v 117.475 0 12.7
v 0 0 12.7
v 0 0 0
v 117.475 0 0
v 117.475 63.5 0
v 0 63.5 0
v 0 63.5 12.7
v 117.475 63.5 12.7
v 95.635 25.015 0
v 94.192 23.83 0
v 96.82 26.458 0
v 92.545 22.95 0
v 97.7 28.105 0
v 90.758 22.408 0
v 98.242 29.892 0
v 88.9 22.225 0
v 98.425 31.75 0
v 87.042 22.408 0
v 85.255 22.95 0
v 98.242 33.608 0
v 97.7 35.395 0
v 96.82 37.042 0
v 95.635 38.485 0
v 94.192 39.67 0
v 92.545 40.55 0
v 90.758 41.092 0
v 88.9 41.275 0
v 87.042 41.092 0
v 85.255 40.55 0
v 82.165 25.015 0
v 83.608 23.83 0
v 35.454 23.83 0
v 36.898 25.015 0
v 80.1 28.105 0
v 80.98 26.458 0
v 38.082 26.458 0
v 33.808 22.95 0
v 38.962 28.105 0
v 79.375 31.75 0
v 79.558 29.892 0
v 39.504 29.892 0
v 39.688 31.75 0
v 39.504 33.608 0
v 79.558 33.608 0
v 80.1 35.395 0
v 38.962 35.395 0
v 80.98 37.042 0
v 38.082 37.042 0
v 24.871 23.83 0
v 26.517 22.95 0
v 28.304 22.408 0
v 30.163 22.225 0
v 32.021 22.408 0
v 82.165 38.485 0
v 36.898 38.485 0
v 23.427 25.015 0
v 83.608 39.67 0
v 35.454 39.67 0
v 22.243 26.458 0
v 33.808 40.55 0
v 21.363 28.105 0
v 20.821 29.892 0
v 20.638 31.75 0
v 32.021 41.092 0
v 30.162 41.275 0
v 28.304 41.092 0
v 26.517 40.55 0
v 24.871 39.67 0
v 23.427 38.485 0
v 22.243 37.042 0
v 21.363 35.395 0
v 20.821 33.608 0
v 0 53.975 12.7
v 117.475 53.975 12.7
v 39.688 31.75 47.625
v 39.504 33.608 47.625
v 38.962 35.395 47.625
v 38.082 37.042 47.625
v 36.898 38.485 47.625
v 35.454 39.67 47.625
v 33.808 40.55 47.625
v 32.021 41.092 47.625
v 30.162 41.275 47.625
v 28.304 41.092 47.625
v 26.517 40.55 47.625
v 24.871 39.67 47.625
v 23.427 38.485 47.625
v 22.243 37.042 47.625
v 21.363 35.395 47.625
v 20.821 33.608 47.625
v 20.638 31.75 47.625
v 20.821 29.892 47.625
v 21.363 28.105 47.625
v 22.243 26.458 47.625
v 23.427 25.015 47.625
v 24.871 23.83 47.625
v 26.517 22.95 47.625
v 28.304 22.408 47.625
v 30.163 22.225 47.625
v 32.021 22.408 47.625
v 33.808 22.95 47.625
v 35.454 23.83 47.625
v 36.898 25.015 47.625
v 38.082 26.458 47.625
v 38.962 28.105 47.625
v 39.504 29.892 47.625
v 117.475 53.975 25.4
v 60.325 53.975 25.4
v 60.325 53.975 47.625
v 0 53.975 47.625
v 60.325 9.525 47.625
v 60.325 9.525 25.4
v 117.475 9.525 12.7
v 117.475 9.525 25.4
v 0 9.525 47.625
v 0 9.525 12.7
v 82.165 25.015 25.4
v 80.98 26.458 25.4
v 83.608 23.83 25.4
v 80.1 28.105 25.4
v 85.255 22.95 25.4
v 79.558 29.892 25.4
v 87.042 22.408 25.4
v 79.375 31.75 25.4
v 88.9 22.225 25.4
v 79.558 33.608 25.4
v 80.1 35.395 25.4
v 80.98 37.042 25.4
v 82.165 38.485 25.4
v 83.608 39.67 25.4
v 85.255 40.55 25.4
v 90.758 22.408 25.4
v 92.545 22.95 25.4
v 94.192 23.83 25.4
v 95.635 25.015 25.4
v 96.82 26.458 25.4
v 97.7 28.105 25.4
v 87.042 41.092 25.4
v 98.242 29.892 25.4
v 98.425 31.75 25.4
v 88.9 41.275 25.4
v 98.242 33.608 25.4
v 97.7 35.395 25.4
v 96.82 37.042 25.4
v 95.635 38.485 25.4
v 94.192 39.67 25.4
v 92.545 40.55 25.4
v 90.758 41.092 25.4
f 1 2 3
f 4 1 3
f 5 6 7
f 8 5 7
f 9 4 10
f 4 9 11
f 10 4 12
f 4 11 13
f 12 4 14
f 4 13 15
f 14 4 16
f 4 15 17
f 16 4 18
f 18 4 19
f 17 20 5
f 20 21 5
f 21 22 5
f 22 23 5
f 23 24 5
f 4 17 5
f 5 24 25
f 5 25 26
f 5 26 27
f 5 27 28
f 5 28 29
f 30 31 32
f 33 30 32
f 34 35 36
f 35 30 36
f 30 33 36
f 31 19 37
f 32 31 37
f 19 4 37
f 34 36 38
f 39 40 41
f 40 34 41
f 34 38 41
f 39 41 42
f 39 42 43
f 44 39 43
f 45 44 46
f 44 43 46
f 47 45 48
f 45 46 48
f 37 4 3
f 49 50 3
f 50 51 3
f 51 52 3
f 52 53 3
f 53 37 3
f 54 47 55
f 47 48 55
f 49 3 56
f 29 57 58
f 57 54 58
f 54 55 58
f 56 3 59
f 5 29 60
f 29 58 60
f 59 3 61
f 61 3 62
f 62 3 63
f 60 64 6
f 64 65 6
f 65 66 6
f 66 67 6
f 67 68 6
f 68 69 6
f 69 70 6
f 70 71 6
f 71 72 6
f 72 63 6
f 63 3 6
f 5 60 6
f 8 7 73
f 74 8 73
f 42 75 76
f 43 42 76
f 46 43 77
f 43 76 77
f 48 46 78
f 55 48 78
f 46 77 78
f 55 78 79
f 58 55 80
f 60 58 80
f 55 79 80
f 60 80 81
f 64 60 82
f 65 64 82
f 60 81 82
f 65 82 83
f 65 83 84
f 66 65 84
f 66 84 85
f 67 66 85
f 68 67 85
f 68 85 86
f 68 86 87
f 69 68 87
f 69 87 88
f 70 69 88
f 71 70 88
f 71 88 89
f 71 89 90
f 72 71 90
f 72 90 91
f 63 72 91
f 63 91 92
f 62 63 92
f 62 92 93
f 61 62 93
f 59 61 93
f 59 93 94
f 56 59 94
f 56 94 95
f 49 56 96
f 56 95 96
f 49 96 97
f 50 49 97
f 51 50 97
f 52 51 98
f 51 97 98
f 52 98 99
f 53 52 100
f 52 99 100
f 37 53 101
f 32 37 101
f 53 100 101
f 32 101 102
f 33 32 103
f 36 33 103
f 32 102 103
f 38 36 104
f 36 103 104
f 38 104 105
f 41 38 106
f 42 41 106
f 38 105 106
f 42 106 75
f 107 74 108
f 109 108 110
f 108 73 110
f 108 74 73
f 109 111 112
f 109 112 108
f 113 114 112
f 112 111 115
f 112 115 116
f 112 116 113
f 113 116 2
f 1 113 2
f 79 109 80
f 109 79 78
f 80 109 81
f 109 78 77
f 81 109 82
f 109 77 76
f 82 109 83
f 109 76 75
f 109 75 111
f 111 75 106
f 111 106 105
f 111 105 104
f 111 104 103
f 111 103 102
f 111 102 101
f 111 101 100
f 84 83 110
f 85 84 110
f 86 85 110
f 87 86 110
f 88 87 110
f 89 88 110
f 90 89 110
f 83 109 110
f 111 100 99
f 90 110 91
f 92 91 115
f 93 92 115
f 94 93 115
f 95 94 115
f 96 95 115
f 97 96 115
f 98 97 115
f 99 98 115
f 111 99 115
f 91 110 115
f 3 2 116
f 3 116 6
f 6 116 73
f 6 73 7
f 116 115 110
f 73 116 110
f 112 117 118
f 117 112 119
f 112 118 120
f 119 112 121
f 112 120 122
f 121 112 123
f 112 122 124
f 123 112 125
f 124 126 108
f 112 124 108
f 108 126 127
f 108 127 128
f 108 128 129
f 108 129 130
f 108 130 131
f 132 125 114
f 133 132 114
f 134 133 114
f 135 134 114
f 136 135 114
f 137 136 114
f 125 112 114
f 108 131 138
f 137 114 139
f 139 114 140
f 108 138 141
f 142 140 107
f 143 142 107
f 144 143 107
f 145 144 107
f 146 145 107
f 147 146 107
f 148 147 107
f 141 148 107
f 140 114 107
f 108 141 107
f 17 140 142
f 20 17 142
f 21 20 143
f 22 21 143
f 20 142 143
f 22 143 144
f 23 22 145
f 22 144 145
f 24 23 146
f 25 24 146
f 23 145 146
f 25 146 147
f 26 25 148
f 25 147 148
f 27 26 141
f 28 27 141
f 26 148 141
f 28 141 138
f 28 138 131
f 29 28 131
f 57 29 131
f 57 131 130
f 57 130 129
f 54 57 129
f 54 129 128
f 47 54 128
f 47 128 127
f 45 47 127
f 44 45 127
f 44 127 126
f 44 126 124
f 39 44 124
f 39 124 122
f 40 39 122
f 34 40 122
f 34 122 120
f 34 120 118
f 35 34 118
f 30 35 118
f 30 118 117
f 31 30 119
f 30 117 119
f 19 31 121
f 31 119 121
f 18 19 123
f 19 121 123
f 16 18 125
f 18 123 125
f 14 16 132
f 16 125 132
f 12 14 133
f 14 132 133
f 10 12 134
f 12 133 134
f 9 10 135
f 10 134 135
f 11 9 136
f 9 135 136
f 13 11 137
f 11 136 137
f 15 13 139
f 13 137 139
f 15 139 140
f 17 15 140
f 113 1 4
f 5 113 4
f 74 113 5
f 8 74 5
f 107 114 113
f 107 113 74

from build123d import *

# Parameters (mm, degrees)
F1_DEPTH = 117.475
F2_R     = 9.525
F3_DEPTH = 161.29
F4_W     = 44.45
F4_H     = 22.225
F5_DEPTH = 57.15


with BuildPart() as f1:
    # F0 (on Right) → F1 (new body)
    with BuildSketch(Plane.YZ):
        Polygon((0, 12.7), (0, 0), (63.5, 0), (63.5, 12.7), (53.975, 12.7), (53.975, 47.625), (9.525, 47.625), (9.525, 12.7), align=None)
    extrude(amount=F1_DEPTH)

    # F2 (on face) → F3 (cut)
    with BuildSketch(Plane.XY.offset(47.625)):
        with Locations((30.1625, 31.75)):
            Circle(F2_R)
        with Locations((88.9, 31.75)):
            Circle(F2_R)
    extrude(amount=-F3_DEPTH, mode=Mode.SUBTRACT)

    # F4 (on face) → F5 (cut)
    with BuildSketch(Plane.YZ.offset(117.475)):
        with Locations((31.75, 36.5125)):
            Rectangle(F4_W, F4_H)
    extrude(amount=-F5_DEPTH, mode=Mode.SUBTRACT)


solid = f1.part
